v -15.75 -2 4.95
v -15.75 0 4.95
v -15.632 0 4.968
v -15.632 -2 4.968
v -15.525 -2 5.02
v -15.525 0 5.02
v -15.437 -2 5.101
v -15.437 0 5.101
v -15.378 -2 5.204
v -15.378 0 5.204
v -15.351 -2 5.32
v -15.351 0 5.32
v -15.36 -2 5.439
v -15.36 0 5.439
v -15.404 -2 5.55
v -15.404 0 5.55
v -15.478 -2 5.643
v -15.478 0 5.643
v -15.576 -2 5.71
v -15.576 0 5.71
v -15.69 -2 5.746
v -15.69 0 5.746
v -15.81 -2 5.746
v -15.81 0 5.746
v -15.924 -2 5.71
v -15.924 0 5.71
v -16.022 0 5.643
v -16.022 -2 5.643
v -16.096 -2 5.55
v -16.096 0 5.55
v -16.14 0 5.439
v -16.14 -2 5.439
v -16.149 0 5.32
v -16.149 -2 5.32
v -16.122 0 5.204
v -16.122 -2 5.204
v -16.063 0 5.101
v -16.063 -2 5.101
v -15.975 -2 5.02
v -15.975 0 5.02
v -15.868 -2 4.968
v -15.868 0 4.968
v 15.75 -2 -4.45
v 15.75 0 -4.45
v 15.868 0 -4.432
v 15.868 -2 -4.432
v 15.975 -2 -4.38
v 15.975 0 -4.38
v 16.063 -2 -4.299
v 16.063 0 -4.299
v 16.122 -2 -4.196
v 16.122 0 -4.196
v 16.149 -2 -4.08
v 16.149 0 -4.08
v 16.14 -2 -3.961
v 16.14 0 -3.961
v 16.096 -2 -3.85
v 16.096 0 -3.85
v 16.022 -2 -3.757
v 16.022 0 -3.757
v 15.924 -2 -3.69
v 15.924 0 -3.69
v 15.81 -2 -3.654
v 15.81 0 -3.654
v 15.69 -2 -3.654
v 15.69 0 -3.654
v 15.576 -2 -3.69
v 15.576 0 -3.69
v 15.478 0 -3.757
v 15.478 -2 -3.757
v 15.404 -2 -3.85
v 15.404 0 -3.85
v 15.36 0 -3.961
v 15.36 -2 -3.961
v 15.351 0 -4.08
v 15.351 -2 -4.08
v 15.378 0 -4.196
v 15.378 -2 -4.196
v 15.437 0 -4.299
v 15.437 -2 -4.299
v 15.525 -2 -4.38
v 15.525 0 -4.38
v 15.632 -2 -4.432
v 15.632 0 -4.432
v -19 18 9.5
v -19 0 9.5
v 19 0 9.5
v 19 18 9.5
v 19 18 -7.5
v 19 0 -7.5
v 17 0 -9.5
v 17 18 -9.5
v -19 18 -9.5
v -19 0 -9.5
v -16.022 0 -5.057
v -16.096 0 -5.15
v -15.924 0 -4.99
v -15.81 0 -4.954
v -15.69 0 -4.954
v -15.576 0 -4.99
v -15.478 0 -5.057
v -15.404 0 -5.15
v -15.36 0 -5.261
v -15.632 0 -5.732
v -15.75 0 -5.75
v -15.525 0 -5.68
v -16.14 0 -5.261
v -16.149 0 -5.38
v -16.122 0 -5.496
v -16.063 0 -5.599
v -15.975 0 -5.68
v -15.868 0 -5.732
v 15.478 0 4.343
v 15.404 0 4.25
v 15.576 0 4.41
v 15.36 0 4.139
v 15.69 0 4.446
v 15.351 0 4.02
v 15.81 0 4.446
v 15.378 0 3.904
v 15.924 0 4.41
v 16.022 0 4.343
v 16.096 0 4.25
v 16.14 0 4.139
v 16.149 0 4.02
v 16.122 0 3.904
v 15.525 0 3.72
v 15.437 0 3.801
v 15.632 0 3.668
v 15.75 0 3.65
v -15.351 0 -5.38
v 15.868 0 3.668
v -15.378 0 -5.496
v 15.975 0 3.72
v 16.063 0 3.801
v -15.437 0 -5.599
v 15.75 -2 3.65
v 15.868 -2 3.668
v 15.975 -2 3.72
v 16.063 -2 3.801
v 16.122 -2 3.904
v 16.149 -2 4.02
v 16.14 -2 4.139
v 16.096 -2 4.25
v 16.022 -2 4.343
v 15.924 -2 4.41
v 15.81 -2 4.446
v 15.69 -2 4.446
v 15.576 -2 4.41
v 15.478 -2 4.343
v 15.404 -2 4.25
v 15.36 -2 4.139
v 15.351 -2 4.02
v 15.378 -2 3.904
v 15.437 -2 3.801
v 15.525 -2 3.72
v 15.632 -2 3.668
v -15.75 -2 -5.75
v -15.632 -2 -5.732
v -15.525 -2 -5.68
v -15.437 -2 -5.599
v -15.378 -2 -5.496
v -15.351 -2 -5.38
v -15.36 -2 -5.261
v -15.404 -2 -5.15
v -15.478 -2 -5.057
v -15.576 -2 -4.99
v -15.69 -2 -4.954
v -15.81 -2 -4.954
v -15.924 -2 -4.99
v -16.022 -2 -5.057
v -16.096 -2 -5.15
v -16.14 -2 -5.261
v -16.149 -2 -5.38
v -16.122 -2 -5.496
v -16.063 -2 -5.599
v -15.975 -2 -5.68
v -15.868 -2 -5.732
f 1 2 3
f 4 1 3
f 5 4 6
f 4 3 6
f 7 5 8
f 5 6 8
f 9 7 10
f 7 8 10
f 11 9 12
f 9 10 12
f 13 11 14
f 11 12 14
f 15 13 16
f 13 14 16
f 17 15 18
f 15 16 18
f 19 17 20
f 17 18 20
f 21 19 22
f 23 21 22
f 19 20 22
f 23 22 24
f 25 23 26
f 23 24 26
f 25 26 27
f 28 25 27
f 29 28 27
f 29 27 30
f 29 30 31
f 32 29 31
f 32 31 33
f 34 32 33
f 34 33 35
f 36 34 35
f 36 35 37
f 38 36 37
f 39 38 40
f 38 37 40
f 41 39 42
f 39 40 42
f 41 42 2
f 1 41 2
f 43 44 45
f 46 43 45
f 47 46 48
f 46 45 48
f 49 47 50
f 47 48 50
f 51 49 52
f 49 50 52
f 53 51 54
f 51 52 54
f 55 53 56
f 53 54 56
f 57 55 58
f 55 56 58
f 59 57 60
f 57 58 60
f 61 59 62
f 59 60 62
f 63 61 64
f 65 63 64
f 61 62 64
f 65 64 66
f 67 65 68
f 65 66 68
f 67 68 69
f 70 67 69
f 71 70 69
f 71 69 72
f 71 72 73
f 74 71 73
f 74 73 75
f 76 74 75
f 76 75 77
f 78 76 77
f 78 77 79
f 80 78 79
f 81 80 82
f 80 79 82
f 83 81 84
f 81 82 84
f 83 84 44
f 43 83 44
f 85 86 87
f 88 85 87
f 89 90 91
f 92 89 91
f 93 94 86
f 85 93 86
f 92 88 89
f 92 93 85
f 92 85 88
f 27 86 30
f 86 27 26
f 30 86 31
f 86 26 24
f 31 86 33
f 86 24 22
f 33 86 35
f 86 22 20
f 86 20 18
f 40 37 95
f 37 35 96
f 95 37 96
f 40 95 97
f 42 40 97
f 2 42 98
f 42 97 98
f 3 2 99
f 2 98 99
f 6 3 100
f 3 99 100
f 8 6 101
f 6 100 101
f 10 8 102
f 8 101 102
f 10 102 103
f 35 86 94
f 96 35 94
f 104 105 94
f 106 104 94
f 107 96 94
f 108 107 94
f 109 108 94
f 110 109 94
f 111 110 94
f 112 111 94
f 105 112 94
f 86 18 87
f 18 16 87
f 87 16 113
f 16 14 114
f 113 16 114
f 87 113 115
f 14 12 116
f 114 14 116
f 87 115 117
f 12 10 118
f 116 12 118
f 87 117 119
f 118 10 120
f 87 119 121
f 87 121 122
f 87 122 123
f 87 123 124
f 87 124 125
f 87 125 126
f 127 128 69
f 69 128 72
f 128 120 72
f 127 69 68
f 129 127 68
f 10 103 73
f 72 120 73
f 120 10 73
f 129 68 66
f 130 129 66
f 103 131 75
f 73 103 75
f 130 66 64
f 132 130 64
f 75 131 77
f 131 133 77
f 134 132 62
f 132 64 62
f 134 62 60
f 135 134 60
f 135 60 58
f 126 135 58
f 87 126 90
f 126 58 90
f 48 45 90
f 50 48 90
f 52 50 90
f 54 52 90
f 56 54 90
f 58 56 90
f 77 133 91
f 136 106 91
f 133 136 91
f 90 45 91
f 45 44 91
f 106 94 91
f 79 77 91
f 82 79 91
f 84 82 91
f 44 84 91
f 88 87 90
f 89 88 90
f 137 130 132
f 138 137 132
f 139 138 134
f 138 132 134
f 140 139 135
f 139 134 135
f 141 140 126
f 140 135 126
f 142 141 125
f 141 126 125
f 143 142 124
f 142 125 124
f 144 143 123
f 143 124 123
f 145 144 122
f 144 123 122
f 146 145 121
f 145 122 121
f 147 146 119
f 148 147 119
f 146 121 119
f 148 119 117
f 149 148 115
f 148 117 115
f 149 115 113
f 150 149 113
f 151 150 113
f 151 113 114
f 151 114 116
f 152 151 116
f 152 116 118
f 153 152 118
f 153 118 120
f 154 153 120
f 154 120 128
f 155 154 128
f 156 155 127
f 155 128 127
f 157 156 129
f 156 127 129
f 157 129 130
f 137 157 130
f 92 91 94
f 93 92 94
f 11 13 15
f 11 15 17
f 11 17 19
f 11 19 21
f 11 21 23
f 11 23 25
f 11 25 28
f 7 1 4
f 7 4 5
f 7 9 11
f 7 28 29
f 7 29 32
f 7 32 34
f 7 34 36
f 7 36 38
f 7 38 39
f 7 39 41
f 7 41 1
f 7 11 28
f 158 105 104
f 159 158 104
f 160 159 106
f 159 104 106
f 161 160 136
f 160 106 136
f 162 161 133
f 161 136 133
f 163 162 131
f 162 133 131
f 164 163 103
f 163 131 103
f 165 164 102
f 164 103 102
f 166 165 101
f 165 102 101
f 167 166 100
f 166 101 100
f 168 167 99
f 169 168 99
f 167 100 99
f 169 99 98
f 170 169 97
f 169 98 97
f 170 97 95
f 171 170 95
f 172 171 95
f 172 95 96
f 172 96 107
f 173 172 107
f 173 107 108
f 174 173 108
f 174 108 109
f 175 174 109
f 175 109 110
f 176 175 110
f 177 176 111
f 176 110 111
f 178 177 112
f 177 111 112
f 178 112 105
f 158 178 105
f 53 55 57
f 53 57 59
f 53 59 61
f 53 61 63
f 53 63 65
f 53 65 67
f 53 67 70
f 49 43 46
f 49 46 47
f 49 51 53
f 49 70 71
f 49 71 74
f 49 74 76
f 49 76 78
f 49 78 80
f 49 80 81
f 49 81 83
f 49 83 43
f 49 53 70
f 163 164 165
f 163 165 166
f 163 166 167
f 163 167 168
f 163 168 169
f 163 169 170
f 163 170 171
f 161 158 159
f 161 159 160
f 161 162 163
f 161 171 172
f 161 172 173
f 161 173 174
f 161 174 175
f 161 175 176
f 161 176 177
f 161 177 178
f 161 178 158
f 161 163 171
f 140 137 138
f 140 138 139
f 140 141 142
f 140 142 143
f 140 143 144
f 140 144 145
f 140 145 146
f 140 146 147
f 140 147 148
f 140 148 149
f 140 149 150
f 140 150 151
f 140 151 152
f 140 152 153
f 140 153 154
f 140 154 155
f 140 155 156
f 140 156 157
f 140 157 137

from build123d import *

# Parameters (mm, degrees)
EXTRUDE_1_DEPTH = 18
SKETCH_2_R      = 0.4
EXTRUDE_2_DEPTH = 2


with BuildPart() as part:
    # Эскиз1 → Бобышка-Вытянуть1 (new body)
    with BuildSketch(Plane(origin=(0, 0, 0), x_dir=(1, 0, 0), z_dir=(0, 1, 0))):
        Polygon((19, -9.5), (19, 7.5), (17, 9.5), (-19, 9.5), (-19, -9.5), align=None)
    extrude(amount=EXTRUDE_1_DEPTH)

    # Эскиз2 → Бобышка-Вытянуть2 (add)
    with BuildSketch(Plane.XZ):
        with Locations(Location((-15.75, 5.35, 0), (0, 0, 270))):
            Circle(SKETCH_2_R)
        with Locations(Location((-15.75, -5.35, 0), (0, 0, 270))):
            Circle(SKETCH_2_R)
        with Locations(Location((15.75, 4.05, 0), (0, 0, 270))):
            Circle(SKETCH_2_R)
        with Locations(Location((15.75, -4.05, 0), (0, 0, 270))):
            Circle(SKETCH_2_R)
    extrude(amount=EXTRUDE_2_DEPTH)


solid = part.part
